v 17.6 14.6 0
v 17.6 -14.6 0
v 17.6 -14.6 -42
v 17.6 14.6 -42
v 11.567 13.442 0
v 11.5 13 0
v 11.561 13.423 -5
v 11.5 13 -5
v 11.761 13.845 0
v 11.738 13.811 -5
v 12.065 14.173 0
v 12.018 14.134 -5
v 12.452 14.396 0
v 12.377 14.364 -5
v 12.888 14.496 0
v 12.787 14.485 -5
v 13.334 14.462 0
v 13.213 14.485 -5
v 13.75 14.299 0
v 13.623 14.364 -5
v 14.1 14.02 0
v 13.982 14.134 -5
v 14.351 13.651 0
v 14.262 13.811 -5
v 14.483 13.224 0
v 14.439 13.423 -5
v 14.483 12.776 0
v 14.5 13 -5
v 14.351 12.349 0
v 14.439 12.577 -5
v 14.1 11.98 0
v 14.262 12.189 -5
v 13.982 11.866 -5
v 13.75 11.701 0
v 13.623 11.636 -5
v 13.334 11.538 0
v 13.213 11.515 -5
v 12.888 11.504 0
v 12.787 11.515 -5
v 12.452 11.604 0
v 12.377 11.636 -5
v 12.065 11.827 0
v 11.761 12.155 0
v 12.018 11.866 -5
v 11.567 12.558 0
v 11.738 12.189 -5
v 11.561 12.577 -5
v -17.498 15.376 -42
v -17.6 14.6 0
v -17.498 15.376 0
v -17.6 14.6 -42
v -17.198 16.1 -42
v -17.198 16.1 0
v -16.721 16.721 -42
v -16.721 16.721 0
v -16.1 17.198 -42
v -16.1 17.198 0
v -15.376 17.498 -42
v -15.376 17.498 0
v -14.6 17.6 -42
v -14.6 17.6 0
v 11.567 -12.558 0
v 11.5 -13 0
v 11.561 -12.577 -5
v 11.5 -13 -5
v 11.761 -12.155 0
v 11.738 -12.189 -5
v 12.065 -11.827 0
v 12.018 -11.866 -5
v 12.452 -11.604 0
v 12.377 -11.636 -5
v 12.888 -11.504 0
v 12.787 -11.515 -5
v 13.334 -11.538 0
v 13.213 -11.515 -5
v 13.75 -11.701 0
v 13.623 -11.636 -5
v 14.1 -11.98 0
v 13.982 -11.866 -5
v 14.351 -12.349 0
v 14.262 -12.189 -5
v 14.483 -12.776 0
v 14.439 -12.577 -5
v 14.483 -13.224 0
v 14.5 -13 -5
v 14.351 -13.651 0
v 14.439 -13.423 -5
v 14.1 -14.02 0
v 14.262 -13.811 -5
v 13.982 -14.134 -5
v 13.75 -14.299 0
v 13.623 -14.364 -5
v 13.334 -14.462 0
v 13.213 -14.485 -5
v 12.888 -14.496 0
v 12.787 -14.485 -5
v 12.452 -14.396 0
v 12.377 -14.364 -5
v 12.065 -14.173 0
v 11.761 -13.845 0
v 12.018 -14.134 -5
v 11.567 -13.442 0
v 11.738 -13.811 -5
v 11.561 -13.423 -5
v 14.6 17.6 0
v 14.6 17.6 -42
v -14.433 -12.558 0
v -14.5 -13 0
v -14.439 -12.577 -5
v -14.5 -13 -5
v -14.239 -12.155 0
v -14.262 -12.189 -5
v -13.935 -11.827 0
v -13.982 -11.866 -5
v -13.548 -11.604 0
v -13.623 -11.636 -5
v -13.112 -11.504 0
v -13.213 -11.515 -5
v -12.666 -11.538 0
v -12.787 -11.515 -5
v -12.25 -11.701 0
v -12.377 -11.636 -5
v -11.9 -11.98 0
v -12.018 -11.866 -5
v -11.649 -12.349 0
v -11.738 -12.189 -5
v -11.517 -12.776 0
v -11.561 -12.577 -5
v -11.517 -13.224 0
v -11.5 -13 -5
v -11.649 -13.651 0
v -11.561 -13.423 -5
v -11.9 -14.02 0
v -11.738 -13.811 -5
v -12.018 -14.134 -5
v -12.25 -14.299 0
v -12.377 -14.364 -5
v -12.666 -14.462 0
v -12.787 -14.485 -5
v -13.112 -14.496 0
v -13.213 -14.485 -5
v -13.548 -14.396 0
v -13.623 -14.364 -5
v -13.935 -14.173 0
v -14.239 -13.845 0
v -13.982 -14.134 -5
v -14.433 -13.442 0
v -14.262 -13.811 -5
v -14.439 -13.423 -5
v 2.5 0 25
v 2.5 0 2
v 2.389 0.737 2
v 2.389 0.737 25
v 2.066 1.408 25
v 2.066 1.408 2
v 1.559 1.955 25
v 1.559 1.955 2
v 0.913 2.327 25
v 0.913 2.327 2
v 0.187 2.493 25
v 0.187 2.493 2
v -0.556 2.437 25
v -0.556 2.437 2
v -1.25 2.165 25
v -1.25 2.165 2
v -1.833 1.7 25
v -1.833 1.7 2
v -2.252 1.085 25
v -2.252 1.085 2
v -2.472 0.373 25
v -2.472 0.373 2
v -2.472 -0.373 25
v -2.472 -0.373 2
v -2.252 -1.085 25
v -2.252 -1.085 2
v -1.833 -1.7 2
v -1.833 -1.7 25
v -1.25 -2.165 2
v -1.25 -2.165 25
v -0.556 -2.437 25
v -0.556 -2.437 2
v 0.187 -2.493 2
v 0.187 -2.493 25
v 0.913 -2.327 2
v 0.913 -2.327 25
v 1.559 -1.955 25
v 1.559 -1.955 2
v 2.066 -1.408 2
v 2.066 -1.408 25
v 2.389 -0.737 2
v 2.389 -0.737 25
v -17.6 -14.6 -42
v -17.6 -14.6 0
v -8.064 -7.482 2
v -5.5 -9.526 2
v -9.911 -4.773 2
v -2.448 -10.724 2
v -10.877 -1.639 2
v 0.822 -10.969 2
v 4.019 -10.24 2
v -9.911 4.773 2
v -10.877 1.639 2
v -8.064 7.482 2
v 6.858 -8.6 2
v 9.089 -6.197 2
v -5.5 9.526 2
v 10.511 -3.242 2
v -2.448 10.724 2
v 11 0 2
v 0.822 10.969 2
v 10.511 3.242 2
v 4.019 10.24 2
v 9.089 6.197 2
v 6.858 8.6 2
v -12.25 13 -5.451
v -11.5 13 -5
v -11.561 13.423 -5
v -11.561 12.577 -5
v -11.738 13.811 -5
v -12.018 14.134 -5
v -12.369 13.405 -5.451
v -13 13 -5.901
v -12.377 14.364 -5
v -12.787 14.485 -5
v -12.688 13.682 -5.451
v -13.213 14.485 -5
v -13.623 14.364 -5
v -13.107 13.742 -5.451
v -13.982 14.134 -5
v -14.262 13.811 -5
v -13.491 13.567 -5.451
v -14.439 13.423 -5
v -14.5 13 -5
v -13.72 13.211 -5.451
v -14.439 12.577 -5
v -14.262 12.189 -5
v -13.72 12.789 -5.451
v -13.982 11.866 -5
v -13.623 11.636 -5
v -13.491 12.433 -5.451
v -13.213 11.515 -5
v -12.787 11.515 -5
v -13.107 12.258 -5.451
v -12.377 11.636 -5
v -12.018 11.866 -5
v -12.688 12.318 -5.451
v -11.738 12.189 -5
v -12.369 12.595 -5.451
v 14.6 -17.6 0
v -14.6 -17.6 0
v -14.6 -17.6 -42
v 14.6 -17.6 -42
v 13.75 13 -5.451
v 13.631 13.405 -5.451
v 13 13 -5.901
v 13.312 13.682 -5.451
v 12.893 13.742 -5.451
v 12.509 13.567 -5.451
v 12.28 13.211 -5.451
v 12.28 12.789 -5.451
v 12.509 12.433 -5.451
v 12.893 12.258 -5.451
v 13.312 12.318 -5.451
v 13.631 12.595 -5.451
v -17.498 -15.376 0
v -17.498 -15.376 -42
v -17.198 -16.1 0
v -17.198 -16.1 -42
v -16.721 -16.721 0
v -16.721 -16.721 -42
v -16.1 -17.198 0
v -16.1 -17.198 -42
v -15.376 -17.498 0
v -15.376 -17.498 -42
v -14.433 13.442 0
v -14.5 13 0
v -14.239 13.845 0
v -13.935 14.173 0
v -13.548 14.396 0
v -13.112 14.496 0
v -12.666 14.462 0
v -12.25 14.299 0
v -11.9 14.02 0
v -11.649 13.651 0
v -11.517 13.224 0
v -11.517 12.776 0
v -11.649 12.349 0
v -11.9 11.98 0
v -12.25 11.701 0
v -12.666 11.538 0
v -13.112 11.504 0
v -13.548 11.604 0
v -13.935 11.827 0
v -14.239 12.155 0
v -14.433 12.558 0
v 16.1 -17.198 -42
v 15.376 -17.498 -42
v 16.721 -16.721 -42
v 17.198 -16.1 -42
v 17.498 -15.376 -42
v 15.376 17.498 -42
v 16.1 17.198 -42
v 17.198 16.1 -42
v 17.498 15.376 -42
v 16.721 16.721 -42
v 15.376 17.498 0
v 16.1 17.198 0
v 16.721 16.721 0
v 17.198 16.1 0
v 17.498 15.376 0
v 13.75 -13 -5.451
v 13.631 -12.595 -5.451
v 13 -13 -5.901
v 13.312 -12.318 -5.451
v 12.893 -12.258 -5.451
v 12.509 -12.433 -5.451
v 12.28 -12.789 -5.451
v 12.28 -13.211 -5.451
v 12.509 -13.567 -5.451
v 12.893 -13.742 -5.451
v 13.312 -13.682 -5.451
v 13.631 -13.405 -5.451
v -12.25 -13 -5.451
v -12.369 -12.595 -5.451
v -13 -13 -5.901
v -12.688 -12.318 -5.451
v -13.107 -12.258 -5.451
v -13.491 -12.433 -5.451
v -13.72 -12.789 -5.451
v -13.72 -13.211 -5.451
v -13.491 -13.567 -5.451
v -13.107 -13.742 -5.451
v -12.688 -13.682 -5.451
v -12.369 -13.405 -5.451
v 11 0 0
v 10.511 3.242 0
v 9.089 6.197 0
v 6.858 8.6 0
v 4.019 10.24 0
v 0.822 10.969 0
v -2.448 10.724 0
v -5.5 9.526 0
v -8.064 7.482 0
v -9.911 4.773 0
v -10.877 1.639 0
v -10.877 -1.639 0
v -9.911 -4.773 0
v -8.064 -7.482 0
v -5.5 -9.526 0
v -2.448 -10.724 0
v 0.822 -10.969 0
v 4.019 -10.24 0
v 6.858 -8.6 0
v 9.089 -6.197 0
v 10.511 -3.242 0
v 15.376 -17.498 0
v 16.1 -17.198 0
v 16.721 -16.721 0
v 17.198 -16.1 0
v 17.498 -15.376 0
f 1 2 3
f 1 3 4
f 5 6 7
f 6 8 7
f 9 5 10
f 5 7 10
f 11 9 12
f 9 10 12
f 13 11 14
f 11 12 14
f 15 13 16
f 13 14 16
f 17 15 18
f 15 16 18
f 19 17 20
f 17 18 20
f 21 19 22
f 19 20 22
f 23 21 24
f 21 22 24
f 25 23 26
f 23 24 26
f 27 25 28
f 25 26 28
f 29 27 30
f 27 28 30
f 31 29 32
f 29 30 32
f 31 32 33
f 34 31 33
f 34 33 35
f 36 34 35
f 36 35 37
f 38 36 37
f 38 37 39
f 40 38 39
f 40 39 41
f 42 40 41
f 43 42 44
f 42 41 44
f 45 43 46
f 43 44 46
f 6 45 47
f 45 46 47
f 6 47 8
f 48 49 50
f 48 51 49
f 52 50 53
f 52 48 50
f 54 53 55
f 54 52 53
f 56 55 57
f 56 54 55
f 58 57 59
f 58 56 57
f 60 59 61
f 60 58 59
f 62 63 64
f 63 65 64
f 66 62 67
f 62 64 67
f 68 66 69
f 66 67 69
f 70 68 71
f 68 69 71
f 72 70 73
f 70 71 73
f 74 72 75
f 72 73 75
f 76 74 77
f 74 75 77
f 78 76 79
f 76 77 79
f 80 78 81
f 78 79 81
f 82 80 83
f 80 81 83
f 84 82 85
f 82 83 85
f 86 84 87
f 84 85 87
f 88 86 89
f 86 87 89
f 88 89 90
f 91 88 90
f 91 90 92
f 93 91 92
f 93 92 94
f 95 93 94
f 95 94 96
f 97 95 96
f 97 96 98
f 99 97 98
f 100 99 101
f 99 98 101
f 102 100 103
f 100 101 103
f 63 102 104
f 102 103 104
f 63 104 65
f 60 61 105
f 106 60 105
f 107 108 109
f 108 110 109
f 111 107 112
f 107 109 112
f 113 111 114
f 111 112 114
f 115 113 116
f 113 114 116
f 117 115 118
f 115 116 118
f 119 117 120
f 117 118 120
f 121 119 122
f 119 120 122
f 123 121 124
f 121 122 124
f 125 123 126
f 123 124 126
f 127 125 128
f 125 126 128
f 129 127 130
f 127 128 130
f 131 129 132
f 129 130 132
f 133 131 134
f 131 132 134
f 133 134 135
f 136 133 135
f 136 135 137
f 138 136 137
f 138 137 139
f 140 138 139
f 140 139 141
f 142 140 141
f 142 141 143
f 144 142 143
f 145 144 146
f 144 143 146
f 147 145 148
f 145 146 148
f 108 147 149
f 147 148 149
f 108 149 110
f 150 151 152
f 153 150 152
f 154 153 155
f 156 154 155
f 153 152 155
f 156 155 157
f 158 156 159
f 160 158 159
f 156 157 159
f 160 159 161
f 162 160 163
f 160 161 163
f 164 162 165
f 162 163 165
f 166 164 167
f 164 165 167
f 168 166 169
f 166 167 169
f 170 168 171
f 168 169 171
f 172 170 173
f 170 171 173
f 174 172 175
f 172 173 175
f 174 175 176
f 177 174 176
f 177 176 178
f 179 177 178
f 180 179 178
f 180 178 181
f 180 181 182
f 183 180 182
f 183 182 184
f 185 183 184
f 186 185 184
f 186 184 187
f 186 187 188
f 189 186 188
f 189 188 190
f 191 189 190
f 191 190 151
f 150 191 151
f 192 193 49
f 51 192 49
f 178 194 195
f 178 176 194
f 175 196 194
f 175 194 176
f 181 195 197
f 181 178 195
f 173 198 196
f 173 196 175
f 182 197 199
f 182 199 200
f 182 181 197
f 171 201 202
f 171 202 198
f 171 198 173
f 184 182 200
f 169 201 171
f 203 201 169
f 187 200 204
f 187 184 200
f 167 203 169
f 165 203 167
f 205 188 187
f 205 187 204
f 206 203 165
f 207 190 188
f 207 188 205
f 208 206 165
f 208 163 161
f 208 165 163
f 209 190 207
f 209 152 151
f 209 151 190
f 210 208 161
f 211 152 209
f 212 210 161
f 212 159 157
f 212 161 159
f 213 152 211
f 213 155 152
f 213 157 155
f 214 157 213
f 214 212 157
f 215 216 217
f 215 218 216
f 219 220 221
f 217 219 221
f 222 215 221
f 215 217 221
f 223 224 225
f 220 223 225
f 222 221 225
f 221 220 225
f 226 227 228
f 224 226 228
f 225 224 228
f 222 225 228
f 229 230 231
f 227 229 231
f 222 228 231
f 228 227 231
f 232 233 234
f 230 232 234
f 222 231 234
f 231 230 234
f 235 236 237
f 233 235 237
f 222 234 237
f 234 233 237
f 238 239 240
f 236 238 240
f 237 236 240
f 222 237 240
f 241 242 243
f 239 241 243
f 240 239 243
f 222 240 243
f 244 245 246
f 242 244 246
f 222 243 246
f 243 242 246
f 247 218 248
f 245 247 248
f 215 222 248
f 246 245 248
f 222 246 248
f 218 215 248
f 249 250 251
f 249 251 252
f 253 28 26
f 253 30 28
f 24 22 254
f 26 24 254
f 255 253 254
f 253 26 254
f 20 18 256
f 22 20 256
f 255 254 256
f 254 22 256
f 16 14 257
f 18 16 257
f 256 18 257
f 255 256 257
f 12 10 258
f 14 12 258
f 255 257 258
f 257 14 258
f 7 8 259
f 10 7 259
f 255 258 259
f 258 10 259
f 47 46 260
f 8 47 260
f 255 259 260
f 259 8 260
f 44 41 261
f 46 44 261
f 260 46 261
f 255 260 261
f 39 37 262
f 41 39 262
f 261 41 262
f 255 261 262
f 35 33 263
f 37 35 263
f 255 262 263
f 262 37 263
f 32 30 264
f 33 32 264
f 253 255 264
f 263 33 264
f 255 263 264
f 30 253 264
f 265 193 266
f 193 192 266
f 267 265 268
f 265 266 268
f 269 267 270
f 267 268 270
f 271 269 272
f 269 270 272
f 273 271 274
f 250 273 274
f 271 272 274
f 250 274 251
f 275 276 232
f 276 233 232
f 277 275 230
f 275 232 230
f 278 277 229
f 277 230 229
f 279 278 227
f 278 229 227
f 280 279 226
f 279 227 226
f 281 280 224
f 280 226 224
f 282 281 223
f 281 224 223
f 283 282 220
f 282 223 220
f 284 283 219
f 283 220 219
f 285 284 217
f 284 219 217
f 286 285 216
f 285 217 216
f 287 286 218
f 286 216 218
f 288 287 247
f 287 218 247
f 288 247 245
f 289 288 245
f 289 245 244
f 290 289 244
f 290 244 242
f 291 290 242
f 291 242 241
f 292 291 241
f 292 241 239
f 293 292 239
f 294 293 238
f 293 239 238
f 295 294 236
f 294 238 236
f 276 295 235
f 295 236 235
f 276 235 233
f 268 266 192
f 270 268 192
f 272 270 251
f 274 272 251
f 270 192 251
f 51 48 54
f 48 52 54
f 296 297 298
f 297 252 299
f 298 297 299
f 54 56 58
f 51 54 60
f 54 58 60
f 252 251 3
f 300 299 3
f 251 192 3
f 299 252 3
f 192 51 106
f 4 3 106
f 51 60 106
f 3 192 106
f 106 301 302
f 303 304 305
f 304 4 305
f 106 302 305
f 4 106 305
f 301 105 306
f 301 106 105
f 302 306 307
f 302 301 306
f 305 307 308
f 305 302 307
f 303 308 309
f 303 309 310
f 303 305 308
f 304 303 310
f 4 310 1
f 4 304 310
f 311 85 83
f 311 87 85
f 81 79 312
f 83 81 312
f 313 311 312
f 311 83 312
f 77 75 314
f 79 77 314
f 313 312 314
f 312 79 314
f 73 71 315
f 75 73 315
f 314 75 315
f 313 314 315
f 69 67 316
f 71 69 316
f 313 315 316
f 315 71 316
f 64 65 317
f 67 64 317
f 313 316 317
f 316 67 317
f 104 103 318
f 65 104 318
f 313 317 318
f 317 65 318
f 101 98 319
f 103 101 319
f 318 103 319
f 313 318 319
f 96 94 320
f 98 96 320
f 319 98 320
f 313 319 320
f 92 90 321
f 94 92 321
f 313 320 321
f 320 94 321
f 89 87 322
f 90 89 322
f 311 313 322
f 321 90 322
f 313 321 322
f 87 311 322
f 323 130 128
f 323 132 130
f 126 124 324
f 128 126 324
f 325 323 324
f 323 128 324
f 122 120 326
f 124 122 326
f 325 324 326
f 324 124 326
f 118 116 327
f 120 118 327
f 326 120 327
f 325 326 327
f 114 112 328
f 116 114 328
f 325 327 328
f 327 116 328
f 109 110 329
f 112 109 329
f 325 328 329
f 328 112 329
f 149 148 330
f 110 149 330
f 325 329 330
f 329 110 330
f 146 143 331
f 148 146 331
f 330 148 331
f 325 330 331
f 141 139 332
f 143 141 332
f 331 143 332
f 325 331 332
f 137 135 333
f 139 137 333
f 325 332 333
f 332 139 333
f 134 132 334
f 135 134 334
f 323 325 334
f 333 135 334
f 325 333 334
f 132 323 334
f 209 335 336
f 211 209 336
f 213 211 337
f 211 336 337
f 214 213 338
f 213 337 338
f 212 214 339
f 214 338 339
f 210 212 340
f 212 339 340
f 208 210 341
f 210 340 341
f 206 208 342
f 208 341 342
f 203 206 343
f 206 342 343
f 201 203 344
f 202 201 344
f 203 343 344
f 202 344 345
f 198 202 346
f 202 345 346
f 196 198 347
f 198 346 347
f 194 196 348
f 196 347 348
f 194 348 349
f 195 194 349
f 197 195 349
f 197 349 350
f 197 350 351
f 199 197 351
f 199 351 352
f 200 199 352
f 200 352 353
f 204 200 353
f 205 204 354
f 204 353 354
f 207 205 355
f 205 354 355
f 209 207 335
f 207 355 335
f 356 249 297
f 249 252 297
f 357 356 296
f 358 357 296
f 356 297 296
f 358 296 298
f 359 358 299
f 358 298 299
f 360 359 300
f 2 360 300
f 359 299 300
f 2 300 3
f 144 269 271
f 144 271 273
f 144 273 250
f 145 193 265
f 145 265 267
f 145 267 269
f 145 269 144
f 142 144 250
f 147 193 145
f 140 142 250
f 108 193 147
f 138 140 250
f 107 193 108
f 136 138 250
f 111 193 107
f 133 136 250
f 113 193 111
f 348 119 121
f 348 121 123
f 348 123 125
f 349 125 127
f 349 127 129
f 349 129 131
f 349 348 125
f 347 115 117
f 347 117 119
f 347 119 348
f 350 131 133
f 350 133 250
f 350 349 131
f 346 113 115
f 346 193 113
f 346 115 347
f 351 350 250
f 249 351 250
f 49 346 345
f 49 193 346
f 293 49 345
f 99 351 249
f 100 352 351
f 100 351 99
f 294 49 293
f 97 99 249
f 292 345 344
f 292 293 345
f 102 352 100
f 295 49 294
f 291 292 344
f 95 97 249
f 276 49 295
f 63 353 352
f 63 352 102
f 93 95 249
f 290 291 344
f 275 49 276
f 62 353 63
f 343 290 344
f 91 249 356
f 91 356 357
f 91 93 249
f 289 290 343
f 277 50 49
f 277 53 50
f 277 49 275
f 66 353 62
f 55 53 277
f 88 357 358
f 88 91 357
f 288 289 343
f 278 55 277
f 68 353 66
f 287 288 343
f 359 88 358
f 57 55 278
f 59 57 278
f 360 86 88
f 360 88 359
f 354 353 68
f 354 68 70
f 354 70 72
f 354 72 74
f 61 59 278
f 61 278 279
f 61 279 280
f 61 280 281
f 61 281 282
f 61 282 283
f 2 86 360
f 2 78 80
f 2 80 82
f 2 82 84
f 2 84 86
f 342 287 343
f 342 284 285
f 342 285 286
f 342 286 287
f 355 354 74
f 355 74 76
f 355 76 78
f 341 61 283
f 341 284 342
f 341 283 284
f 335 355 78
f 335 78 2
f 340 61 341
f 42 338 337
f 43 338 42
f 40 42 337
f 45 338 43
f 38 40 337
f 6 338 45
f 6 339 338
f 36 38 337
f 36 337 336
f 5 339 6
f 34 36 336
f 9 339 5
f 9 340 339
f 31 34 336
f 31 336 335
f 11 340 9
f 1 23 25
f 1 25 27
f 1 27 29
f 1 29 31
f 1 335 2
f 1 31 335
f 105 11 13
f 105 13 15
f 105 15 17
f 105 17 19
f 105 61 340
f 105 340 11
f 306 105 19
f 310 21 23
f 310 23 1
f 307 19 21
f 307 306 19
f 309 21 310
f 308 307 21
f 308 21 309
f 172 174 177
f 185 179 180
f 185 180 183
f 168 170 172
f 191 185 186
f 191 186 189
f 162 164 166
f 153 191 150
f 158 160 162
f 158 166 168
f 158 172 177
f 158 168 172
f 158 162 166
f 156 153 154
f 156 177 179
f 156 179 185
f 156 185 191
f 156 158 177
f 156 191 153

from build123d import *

# Parameters (mm, degrees)
F0_W     = 35.2
F0_H     = 35.2
F0_W_2   = 26
F0_H_2   = 26
F0_R     = 11
F0_R_2   = 2.5
F1_DEPTH = 42
F2_DEPTH = 2
F3_DEPTH = 25
F4_R     = 3
F5_D     = 3
F5_DEPTH = 5
F5_TIP   = 0.9012909285


with BuildPart() as f1:
    # F0 (on Top) → F1 (new body)
    with BuildSketch(Plane.XY):
        Rectangle(F0_W, F0_H)
        Rectangle(F0_W_2, F0_H_2, mode=Mode.SUBTRACT)
        Rectangle(F0_W_2, F0_H_2)
        Circle(F0_R, mode=Mode.SUBTRACT)
        Circle(F0_R)
        Circle(F0_R_2, mode=Mode.SUBTRACT)
        Circle(F0_R_2)
    extrude(amount=-F1_DEPTH)

    # F0 (on Top) → F2 (join)
    with BuildSketch(Plane.XY):
        Circle(F0_R)
        Circle(F0_R_2, mode=Mode.SUBTRACT)
    extrude(amount=F2_DEPTH)

    # F0 (on Top) → F3 (join)
    with BuildSketch(Plane.XY):
        Circle(F0_R_2)
    extrude(amount=F3_DEPTH)

    # F4
    f4_edges = [f1.edges().sort_by_distance(p)[0] for p in [
        (17.6, 17.6, -21),
        (17.6, -17.6, -21),
        (-17.6, -17.6, -21),
        (-17.6, 17.6, -21),
    ]]
    fillet(f4_edges, radius=F4_R)

    # F5
    with Locations(Plane.XY):
        with Locations((-13, 13), (13, 13), (13, -13), (-13, -13)):
            Hole(F5_D / 2, depth=F5_DEPTH)
            with Locations((0, 0, -(F5_DEPTH + F5_TIP / 2))):  # 118° drill point
                Cone(0, F5_D / 2, F5_TIP, mode=Mode.SUBTRACT)


solid = f1.part
